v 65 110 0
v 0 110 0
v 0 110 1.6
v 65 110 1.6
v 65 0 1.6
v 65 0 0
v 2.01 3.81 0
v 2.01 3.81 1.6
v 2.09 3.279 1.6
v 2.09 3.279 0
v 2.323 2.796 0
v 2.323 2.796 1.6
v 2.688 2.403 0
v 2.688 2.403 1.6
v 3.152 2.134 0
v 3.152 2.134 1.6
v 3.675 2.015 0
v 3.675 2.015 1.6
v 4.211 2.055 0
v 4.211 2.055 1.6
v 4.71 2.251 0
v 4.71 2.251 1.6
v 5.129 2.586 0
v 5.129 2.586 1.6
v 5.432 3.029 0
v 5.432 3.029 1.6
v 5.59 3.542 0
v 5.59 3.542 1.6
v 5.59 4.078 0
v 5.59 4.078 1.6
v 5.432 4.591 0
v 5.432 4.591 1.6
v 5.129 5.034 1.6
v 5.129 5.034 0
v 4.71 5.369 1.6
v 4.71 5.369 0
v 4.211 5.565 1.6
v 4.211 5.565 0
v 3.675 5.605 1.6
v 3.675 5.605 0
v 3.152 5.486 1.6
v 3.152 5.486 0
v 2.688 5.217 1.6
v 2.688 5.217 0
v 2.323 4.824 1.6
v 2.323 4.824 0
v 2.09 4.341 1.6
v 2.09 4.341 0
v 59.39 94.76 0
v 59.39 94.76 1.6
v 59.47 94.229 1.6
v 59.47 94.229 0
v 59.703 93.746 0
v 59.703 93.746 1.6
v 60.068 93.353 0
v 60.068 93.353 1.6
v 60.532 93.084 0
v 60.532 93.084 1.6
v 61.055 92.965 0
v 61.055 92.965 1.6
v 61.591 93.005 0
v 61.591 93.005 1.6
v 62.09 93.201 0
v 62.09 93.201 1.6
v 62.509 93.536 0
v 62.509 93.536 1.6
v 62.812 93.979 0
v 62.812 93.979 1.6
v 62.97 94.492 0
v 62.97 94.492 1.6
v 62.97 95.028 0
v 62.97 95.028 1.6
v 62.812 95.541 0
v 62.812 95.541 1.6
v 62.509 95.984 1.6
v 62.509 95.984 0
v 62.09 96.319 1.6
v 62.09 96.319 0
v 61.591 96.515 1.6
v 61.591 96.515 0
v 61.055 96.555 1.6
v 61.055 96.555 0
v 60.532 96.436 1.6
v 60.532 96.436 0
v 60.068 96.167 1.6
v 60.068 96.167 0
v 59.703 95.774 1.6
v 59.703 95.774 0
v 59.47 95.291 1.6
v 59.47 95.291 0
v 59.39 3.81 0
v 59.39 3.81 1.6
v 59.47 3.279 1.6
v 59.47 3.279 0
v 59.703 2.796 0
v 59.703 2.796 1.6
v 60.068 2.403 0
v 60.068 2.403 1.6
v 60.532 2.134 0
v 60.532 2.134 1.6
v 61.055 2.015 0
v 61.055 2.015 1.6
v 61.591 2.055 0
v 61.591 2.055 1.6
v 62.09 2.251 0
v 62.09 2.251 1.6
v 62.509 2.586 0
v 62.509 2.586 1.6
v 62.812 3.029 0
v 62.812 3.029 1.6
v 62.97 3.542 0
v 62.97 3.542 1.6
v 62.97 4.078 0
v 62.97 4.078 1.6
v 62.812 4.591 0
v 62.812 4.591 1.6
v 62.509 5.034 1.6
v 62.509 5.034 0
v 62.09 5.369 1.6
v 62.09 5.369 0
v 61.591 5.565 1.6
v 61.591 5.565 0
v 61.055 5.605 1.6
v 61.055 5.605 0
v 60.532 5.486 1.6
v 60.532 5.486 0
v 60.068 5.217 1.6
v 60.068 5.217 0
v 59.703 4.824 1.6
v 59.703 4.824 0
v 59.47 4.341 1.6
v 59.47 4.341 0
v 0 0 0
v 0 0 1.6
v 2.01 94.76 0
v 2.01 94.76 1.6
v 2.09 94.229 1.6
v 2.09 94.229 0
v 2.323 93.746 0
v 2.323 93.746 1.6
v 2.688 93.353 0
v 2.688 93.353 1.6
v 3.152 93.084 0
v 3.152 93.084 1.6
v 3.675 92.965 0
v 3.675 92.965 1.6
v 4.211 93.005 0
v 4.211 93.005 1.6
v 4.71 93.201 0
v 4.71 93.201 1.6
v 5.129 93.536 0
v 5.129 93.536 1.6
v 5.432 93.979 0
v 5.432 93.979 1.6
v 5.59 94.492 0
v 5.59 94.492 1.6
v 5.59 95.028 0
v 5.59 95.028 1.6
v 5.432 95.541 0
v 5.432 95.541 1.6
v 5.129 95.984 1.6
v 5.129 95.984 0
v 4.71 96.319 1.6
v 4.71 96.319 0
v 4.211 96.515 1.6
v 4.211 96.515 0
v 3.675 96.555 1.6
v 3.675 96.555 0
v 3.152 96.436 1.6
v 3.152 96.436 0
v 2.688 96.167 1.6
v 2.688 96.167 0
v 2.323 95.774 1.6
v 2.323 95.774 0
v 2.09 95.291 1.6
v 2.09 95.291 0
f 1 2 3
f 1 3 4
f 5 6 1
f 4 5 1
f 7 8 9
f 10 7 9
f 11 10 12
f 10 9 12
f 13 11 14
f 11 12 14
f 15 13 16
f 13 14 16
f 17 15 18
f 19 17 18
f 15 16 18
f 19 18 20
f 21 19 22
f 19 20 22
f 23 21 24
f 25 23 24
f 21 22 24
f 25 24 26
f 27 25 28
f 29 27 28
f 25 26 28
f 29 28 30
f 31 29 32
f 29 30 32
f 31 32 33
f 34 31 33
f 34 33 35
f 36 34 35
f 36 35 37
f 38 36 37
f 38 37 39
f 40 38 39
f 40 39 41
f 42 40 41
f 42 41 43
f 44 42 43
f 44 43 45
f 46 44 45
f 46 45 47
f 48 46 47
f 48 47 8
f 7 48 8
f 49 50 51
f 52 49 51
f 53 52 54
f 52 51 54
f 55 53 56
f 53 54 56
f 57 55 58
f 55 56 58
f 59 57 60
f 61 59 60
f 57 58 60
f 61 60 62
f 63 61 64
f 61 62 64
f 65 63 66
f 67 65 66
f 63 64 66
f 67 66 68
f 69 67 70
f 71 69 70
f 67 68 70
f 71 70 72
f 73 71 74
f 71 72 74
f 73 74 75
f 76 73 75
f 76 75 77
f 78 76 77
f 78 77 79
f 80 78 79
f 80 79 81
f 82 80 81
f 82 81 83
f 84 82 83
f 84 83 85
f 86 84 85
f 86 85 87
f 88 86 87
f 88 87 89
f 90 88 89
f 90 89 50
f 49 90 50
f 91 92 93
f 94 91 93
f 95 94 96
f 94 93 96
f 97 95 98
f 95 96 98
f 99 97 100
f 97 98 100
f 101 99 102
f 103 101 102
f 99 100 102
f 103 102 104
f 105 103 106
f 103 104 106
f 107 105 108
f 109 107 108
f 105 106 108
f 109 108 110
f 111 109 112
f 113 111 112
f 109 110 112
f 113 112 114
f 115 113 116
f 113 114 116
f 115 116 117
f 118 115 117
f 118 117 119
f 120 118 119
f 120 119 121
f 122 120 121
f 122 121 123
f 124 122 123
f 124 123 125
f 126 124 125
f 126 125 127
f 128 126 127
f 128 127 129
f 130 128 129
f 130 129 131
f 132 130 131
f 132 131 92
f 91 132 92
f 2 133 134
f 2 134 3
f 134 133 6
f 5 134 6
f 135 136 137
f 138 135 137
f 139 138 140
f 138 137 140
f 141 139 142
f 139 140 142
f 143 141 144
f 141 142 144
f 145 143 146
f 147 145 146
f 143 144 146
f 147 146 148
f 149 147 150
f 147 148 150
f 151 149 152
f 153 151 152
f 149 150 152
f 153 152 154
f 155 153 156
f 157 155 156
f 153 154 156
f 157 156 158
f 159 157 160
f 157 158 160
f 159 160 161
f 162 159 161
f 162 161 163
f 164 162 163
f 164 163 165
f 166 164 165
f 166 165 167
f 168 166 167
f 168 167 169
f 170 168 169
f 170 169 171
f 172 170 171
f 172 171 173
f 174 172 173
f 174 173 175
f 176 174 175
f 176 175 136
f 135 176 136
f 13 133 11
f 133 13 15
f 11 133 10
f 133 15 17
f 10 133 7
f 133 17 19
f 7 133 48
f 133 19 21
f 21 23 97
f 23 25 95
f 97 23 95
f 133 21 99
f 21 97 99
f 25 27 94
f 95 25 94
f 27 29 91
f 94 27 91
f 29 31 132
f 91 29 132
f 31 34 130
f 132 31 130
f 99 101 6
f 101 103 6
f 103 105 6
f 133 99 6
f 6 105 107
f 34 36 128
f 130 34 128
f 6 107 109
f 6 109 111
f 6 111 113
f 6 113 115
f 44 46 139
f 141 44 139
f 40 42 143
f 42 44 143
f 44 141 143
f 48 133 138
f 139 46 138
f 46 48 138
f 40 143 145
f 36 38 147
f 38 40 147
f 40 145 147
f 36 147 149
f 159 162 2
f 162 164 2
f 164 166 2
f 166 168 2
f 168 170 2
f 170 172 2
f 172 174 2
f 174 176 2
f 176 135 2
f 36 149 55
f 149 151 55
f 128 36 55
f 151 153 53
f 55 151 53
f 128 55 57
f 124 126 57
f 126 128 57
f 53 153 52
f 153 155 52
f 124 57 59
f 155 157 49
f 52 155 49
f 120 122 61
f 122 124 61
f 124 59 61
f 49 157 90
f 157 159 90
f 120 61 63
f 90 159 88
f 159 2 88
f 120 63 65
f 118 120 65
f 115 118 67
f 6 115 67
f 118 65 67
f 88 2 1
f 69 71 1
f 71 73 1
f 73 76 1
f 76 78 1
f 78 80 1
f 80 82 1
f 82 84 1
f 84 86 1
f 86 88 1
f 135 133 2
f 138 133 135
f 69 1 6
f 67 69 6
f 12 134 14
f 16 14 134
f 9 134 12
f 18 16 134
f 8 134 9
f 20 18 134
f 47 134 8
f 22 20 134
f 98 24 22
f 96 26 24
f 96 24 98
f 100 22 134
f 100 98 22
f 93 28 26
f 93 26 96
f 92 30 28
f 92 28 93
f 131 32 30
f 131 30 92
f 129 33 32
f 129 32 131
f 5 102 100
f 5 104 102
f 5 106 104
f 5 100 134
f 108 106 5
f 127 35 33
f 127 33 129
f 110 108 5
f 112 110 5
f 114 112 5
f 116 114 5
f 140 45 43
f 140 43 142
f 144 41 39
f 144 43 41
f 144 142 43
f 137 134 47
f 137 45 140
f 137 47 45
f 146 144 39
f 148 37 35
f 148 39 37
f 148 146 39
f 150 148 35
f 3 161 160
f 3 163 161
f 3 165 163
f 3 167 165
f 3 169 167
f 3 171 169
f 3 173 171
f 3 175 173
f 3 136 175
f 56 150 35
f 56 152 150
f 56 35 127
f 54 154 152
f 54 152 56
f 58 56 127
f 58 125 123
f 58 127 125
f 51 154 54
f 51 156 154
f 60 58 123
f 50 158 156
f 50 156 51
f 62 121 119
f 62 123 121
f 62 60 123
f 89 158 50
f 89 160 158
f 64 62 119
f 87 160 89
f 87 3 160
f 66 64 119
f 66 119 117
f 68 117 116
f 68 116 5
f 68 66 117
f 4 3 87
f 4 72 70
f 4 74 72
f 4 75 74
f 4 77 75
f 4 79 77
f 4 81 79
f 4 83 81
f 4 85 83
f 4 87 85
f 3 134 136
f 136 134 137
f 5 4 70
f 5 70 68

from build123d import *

# Parameters (mm, degrees)
F0_W     = 65
F0_H     = 110
F1_DEPTH = 1.6
F2_D     = 3.6


with BuildPart() as f1:
    # F0 (on Top) → F1 (new body)
    with BuildSketch(Plane.XY):
        with Locations((32.5, 55)):
            Rectangle(F0_W, F0_H)
    extrude(amount=F1_DEPTH)

    # F2 (through all)
    with Locations(Plane(origin=(0, 0, 0), x_dir=(1, 0, 0), z_dir=(0, 0, -1))):
        with Locations((3.81, -94.76), (61.19, -94.76), (3.81, -3.81), (61.19, -3.81)):
            Hole(F2_D / 2)


solid = f1.part
